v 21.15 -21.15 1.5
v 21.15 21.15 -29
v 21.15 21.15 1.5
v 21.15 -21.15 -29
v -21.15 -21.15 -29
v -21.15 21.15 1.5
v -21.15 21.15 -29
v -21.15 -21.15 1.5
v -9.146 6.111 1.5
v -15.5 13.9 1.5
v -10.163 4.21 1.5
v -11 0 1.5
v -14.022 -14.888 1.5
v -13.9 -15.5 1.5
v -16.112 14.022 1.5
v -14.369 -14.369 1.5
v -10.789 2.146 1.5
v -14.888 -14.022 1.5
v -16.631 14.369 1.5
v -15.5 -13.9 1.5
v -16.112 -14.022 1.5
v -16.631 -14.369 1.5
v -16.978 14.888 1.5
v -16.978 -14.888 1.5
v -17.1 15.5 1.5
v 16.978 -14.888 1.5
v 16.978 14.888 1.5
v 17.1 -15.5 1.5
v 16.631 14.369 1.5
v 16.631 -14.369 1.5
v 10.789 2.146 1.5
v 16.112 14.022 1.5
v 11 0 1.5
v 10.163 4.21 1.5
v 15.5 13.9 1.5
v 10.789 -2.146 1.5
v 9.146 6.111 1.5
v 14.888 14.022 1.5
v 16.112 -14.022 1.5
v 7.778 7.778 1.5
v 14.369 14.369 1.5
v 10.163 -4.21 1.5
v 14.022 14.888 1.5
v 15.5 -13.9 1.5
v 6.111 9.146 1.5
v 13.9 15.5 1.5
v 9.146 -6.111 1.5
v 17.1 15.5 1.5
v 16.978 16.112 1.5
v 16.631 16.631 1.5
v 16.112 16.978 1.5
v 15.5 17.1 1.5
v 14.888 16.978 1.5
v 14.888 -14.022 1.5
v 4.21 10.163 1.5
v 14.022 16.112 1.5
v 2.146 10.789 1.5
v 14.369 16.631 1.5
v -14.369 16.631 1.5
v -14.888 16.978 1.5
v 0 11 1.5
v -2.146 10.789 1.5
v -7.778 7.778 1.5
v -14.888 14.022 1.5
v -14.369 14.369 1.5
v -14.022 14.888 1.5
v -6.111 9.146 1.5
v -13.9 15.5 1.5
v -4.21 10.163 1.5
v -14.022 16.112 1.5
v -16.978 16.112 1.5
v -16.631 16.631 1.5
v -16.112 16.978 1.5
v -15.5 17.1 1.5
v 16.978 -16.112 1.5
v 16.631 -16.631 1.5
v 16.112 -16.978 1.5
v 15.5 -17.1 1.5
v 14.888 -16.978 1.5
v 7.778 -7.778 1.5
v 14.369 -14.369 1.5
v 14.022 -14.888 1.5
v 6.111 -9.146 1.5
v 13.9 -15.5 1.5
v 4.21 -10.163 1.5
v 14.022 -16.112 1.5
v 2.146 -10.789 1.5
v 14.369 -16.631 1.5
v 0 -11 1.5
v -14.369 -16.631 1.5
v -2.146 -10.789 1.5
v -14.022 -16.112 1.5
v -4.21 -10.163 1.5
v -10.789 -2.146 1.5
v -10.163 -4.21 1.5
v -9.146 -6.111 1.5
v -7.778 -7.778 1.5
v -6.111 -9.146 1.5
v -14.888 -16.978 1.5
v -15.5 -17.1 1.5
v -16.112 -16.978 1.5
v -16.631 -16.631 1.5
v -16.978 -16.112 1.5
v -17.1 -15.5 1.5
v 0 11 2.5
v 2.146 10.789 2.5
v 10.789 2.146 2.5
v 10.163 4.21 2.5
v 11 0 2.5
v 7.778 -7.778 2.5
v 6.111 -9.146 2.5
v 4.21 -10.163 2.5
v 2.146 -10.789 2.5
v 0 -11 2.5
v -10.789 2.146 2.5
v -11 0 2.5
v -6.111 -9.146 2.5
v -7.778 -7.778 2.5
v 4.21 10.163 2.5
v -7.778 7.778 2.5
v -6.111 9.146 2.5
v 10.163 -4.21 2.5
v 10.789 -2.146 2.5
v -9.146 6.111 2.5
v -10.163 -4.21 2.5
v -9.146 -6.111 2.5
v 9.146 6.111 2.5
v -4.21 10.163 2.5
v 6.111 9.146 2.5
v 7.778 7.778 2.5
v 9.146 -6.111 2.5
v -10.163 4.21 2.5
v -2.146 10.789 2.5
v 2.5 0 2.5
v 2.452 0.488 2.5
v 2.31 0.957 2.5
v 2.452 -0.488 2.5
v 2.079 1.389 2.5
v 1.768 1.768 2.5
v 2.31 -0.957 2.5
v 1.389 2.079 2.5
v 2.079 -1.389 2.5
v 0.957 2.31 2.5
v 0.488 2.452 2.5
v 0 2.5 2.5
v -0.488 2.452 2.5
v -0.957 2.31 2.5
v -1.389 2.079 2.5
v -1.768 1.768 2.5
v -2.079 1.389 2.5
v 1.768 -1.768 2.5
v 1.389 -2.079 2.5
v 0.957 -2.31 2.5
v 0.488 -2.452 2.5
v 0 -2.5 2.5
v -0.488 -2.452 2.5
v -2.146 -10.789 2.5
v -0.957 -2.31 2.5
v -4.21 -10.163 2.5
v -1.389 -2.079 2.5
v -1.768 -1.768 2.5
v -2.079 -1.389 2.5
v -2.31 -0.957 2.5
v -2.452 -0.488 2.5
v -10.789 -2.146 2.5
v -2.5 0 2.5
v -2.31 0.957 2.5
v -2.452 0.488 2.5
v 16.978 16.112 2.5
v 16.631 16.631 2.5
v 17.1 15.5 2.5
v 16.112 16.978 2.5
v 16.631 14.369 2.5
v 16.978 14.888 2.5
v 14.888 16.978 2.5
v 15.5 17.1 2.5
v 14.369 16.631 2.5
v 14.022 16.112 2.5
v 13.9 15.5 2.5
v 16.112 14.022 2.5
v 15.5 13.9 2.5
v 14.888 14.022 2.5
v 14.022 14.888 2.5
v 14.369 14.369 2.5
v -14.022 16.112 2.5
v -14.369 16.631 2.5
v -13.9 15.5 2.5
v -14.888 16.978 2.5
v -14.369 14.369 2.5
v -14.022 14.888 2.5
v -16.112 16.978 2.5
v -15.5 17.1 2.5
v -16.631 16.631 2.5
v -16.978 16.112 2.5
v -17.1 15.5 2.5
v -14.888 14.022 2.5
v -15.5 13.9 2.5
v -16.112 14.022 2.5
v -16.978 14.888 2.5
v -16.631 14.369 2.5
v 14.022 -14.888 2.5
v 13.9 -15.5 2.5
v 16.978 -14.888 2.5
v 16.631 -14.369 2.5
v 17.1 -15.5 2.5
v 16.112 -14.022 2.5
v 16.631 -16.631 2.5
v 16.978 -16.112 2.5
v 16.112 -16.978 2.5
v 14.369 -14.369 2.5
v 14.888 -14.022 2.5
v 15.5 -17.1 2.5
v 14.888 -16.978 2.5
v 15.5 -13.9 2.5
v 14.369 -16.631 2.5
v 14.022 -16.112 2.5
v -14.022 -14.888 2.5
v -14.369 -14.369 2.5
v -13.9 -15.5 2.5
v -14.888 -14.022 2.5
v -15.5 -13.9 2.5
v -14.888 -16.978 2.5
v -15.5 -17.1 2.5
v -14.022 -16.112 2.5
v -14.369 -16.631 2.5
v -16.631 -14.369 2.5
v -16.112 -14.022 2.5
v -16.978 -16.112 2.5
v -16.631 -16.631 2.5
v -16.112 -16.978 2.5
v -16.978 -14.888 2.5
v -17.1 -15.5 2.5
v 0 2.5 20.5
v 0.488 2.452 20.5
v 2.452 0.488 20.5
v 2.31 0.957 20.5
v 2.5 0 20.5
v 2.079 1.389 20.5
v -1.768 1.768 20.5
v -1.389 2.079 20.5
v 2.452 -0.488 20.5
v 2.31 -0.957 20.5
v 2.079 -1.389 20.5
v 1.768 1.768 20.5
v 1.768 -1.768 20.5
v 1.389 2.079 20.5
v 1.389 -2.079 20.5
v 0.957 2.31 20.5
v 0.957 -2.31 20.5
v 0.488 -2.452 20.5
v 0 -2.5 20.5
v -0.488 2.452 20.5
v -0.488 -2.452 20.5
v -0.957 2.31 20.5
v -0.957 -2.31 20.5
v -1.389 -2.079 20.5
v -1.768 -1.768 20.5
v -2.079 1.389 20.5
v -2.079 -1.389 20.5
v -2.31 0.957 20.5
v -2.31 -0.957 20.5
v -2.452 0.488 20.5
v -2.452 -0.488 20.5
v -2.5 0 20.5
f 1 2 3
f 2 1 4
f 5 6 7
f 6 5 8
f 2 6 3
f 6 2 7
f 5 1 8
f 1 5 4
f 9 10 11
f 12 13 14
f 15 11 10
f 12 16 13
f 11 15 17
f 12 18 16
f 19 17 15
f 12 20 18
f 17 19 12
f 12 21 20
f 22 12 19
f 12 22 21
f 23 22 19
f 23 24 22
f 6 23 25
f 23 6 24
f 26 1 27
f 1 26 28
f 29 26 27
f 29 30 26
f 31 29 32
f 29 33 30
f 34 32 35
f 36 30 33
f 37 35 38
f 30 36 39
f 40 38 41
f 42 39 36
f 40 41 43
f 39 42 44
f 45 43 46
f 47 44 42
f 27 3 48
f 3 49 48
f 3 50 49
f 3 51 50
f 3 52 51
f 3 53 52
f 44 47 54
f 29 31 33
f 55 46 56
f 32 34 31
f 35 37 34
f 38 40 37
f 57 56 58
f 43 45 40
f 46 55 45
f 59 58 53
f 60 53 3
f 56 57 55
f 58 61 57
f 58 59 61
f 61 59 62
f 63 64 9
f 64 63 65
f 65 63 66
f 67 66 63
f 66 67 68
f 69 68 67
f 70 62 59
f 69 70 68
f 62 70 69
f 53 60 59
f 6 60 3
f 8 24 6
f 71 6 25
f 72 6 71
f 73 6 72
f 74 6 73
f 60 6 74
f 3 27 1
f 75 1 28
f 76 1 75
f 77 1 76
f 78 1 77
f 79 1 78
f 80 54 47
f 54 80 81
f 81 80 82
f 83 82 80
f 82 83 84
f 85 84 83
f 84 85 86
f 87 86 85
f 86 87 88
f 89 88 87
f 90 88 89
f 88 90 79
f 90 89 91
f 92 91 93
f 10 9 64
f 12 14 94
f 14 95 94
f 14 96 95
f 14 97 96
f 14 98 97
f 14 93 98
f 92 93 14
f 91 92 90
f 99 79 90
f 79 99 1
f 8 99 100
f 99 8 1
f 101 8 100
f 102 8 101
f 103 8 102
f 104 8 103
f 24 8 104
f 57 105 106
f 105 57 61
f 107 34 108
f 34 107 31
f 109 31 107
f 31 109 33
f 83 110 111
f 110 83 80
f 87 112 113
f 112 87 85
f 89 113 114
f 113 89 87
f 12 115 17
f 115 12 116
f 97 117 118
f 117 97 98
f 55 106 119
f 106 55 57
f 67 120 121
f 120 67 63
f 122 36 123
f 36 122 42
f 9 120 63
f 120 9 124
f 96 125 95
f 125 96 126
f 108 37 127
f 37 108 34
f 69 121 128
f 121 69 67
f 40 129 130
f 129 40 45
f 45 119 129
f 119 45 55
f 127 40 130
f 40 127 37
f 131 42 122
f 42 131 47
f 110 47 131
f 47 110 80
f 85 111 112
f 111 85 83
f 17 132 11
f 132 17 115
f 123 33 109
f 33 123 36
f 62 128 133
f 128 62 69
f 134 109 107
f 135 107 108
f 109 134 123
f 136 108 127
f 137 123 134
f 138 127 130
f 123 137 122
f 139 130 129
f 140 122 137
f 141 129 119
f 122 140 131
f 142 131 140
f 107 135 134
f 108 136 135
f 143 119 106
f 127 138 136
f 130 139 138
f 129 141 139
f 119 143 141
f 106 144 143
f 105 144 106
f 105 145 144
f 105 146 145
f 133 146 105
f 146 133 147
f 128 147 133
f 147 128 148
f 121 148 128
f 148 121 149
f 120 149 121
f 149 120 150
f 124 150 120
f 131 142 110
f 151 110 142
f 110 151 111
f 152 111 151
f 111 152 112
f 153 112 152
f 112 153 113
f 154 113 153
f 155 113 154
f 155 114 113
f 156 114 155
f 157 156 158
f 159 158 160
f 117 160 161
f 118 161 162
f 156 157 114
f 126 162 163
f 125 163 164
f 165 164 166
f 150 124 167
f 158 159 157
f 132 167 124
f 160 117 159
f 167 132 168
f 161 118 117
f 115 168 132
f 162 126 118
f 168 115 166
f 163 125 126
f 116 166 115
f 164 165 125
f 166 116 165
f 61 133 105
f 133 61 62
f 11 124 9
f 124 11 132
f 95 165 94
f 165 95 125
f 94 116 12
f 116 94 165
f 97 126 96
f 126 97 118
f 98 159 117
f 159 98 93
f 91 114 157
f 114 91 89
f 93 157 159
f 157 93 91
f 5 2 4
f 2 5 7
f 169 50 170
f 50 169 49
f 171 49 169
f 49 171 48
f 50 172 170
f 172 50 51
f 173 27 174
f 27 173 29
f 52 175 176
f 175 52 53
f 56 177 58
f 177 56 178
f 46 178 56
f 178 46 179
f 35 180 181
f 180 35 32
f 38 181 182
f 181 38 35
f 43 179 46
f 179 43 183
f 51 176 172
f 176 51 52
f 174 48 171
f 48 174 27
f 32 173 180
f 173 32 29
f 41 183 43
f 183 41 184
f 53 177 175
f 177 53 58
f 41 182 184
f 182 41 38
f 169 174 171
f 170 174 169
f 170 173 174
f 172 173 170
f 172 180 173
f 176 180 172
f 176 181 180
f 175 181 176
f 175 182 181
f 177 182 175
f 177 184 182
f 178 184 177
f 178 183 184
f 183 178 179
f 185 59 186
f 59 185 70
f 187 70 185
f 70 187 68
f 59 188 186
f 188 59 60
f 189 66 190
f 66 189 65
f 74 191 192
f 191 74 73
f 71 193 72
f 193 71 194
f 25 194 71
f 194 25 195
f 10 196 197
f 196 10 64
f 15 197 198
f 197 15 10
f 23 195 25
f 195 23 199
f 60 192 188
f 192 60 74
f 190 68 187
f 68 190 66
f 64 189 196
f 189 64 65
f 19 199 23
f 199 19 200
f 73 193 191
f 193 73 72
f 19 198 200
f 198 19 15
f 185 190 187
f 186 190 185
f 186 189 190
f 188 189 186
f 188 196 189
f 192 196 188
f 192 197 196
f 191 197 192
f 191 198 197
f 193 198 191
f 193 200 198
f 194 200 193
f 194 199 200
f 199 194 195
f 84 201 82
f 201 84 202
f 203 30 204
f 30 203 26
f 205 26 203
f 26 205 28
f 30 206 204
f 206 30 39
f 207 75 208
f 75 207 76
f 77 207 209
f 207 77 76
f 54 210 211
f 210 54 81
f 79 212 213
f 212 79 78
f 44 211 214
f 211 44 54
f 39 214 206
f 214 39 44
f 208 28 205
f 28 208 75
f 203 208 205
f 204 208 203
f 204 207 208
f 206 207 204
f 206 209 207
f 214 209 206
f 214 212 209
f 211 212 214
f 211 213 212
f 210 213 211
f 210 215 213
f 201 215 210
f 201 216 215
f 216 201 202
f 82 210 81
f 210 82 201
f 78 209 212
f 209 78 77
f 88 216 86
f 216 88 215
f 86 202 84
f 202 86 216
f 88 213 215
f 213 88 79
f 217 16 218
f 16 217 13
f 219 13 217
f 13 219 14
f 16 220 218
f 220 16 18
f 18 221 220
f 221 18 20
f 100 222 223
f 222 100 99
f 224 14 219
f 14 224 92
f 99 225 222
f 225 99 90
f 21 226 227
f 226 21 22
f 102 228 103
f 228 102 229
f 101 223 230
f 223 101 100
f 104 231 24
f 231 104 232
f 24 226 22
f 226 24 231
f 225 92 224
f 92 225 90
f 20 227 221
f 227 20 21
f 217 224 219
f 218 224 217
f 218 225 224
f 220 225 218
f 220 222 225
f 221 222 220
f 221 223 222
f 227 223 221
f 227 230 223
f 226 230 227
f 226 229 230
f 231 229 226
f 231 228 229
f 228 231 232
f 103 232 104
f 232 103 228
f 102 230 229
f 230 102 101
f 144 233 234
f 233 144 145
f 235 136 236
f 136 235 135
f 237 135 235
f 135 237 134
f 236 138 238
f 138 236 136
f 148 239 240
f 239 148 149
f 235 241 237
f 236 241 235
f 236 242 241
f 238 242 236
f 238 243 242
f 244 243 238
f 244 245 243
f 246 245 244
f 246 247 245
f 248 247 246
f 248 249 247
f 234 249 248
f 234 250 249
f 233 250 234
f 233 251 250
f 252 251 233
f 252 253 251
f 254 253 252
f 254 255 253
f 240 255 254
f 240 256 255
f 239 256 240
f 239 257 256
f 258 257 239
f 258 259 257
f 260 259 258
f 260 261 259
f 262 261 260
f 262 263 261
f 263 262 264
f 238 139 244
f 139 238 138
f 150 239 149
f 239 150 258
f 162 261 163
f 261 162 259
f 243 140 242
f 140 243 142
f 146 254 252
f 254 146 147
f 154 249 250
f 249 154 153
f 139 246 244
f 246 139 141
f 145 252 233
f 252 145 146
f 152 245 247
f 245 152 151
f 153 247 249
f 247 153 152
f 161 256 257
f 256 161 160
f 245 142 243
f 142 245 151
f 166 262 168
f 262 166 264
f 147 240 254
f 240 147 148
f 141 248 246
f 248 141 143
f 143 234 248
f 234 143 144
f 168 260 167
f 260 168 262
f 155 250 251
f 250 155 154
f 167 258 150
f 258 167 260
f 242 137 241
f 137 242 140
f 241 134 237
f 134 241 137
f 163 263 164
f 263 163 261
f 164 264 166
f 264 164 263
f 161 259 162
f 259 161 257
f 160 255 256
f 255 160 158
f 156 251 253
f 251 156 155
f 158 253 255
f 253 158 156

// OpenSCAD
// Parameters
face_width = 42.3; //[21.15:84.6:0.1]
body_length = 26.5; //[13.25:53:0.1]
body_depth = 42.3; //[21.15:84.6:0.1]
shaft_diameter = 5; //[2.5:10:0.1]
shaft_length = 20; //[10:40:0.5]
mounting_hole_spacing = 31; //[15.5:62:0.1]
mounting_hole_diameter = 3.2; //[2:6:0.1]
corner_radius = 2; //[0:6:0.1]
face_plate_thickness = 3; //[1.5:6:0.1]
shaft_offset_from_face = 0; //[-2:5:0.1]
shaft_boss_diameter = 22; //[11:44:0.1]
shaft_boss_length = 2; //[1:6:0.1]
rear_cap_thickness = 2; //[1:6:0.1]
overlap = 1; //[0.5:2:0.1]
ttrack_length = 60; //[30:120:1]
ttrack_pitch = 20; //[10:40:1]
ttrack_num_insert_holes = 3; //[1:10:1]
aux_hole_diameter = 3; //[1.5:6:0.1]
aux_hole_depth = 2.5; //[1:6:0.1]

// Motor Shaft
module motor_shaft() {
  color("Silver") {
    translate([0, 0, face_plate_thickness/2 + shaft_offset_from_face + shaft_length/2 - overlap])
      cylinder(r=shaft_diameter/2, h=shaft_length, center=true, $fn=32);
  }
}

// Ttrack Hole Positions
module ttrack_hole_positions() {
  color("DimGray") {
    union() {
      translate([0, ttrack_pitch, face_plate_thickness/2 - aux_hole_depth/2])
        cylinder(r=aux_hole_diameter/2, h=aux_hole_depth + 2*overlap, center=true, $fn=16);
      translate([0, 0, face_plate_thickness/2 - aux_hole_depth/2])
        cylinder(r=aux_hole_diameter/2, h=aux_hole_depth + 2*overlap, center=true, $fn=16);
      translate([0, -ttrack_pitch, face_plate_thickness/2 - aux_hole_depth/2])
        cylinder(r=aux_hole_diameter/2, h=aux_hole_depth + 2*overlap, center=true, $fn=16);
    }
  }
}

// Ttrack Insert Hole Positions
module ttrack_insert_hole_positions() {
  color("DimGray") {
    union() {
      for (i = [1:ttrack_num_insert_holes]) {
        translate([-ttrack_length/2 + i*ttrack_length/(ttrack_num_insert_holes+1), 0, face_plate_thickness/2 - aux_hole_depth/2])
          cylinder(r=aux_hole_diameter/2, h=aux_hole_depth + 2*overlap, center=true, $fn=16);
      }
    }
  }
}

// Rail Hole Positions
module rail_hole_positions() {
  color("DimGray") {
    union() {
      translate([ttrack_pitch, 0, face_plate_thickness/2 - aux_hole_depth/2])
        cylinder(r=aux_hole_diameter/2, h=aux_hole_depth + 2*overlap, center=true, $fn=16);
      translate([0, 0, face_plate_thickness/2 - aux_hole_depth/2])
        cylinder(r=aux_hole_diameter/2, h=aux_hole_depth + 2*overlap, center=true, $fn=16);
      translate([-ttrack_pitch, 0, face_plate_thickness/2 - aux_hole_depth/2])
        cylinder(r=aux_hole_diameter/2, h=aux_hole_depth + 2*overlap, center=true, $fn=16);
    }
  }
}

// Grill Hole Positions
module grill_hole_positions() {
  color("DimGray") {
    union() {
      translate([ttrack_pitch/2, ttrack_pitch/2, face_plate_thickness/2 - aux_hole_depth/2])
        cylinder(r=aux_hole_diameter/2, h=aux_hole_depth + 2*overlap, center=true, $fn=16);
      translate([-ttrack_pitch/2, ttrack_pitch/2, face_plate_thickness/2 - aux_hole_depth/2])
        cylinder(r=aux_hole_diameter/2, h=aux_hole_depth + 2*overlap, center=true, $fn=16);
      translate([ttrack_pitch/2, -ttrack_pitch/2, face_plate_thickness/2 - aux_hole_depth/2])
        cylinder(r=aux_hole_diameter/2, h=aux_hole_depth + 2*overlap, center=true, $fn=16);
      translate([-ttrack_pitch/2, -ttrack_pitch/2, face_plate_thickness/2 - aux_hole_depth/2])
        cylinder(r=aux_hole_diameter/2, h=aux_hole_depth + 2*overlap, center=true, $fn=16);
    }
  }
}

// Assembly
module assembly() {
  color("Black") {
    // Motor Body
    translate([0, 0, -(face_plate_thickness/2 + body_length/2 - overlap)])
      cube([face_width, body_depth, body_length], center=true);
    // Front Face Plate
    translate([0, 0, 0])
      cube([face_width, face_width, face_plate_thickness], center=true);
    // Shaft Boss
    translate([0, 0, face_plate_thickness/2 + shaft_boss_length/2 - overlap])
      cylinder(r=shaft_boss_diameter/2, h=shaft_boss_length, center=true, $fn=32);
    // Rear Cap
    translate([0, 0, -(face_plate_thickness/2 + body_length - overlap + rear_cap_thickness/2)])
      cube([face_width, body_depth, rear_cap_thickness], center=true);
  }
  // Motor Shaft
  motor_shaft();
  // Mounting Holes
  difference() {
    union() {
      translate([mounting_hole_spacing/2, mounting_hole_spacing/2, 0])
        cylinder(r=mounting_hole_diameter/2, h=face_plate_thickness + 2*overlap, center=true, $fn=16);
      translate([-mounting_hole_spacing/2, mounting_hole_spacing/2, 0])
        cylinder(r=mounting_hole_diameter/2, h=face_plate_thickness + 2*overlap, center=true, $fn=16);
      translate([mounting_hole_spacing/2, -mounting_hole_spacing/2, 0])
        cylinder(r=mounting_hole_diameter/2, h=face_plate_thickness + 2*overlap, center=true, $fn=16);
      translate([-mounting_hole_spacing/2, -mounting_hole_spacing/2, 0])
        cylinder(r=mounting_hole_diameter/2, h=face_plate_thickness + 2*overlap, center=true, $fn=16);
    }
    // Ttrack Hole Positions
    ttrack_hole_positions();
    // Ttrack Insert Hole Positions
    ttrack_insert_hole_positions();
    // Rail Hole Positions
    rail_hole_positions();
    // Grill Hole Positions
    grill_hole_positions();
  }
}

assembly();
